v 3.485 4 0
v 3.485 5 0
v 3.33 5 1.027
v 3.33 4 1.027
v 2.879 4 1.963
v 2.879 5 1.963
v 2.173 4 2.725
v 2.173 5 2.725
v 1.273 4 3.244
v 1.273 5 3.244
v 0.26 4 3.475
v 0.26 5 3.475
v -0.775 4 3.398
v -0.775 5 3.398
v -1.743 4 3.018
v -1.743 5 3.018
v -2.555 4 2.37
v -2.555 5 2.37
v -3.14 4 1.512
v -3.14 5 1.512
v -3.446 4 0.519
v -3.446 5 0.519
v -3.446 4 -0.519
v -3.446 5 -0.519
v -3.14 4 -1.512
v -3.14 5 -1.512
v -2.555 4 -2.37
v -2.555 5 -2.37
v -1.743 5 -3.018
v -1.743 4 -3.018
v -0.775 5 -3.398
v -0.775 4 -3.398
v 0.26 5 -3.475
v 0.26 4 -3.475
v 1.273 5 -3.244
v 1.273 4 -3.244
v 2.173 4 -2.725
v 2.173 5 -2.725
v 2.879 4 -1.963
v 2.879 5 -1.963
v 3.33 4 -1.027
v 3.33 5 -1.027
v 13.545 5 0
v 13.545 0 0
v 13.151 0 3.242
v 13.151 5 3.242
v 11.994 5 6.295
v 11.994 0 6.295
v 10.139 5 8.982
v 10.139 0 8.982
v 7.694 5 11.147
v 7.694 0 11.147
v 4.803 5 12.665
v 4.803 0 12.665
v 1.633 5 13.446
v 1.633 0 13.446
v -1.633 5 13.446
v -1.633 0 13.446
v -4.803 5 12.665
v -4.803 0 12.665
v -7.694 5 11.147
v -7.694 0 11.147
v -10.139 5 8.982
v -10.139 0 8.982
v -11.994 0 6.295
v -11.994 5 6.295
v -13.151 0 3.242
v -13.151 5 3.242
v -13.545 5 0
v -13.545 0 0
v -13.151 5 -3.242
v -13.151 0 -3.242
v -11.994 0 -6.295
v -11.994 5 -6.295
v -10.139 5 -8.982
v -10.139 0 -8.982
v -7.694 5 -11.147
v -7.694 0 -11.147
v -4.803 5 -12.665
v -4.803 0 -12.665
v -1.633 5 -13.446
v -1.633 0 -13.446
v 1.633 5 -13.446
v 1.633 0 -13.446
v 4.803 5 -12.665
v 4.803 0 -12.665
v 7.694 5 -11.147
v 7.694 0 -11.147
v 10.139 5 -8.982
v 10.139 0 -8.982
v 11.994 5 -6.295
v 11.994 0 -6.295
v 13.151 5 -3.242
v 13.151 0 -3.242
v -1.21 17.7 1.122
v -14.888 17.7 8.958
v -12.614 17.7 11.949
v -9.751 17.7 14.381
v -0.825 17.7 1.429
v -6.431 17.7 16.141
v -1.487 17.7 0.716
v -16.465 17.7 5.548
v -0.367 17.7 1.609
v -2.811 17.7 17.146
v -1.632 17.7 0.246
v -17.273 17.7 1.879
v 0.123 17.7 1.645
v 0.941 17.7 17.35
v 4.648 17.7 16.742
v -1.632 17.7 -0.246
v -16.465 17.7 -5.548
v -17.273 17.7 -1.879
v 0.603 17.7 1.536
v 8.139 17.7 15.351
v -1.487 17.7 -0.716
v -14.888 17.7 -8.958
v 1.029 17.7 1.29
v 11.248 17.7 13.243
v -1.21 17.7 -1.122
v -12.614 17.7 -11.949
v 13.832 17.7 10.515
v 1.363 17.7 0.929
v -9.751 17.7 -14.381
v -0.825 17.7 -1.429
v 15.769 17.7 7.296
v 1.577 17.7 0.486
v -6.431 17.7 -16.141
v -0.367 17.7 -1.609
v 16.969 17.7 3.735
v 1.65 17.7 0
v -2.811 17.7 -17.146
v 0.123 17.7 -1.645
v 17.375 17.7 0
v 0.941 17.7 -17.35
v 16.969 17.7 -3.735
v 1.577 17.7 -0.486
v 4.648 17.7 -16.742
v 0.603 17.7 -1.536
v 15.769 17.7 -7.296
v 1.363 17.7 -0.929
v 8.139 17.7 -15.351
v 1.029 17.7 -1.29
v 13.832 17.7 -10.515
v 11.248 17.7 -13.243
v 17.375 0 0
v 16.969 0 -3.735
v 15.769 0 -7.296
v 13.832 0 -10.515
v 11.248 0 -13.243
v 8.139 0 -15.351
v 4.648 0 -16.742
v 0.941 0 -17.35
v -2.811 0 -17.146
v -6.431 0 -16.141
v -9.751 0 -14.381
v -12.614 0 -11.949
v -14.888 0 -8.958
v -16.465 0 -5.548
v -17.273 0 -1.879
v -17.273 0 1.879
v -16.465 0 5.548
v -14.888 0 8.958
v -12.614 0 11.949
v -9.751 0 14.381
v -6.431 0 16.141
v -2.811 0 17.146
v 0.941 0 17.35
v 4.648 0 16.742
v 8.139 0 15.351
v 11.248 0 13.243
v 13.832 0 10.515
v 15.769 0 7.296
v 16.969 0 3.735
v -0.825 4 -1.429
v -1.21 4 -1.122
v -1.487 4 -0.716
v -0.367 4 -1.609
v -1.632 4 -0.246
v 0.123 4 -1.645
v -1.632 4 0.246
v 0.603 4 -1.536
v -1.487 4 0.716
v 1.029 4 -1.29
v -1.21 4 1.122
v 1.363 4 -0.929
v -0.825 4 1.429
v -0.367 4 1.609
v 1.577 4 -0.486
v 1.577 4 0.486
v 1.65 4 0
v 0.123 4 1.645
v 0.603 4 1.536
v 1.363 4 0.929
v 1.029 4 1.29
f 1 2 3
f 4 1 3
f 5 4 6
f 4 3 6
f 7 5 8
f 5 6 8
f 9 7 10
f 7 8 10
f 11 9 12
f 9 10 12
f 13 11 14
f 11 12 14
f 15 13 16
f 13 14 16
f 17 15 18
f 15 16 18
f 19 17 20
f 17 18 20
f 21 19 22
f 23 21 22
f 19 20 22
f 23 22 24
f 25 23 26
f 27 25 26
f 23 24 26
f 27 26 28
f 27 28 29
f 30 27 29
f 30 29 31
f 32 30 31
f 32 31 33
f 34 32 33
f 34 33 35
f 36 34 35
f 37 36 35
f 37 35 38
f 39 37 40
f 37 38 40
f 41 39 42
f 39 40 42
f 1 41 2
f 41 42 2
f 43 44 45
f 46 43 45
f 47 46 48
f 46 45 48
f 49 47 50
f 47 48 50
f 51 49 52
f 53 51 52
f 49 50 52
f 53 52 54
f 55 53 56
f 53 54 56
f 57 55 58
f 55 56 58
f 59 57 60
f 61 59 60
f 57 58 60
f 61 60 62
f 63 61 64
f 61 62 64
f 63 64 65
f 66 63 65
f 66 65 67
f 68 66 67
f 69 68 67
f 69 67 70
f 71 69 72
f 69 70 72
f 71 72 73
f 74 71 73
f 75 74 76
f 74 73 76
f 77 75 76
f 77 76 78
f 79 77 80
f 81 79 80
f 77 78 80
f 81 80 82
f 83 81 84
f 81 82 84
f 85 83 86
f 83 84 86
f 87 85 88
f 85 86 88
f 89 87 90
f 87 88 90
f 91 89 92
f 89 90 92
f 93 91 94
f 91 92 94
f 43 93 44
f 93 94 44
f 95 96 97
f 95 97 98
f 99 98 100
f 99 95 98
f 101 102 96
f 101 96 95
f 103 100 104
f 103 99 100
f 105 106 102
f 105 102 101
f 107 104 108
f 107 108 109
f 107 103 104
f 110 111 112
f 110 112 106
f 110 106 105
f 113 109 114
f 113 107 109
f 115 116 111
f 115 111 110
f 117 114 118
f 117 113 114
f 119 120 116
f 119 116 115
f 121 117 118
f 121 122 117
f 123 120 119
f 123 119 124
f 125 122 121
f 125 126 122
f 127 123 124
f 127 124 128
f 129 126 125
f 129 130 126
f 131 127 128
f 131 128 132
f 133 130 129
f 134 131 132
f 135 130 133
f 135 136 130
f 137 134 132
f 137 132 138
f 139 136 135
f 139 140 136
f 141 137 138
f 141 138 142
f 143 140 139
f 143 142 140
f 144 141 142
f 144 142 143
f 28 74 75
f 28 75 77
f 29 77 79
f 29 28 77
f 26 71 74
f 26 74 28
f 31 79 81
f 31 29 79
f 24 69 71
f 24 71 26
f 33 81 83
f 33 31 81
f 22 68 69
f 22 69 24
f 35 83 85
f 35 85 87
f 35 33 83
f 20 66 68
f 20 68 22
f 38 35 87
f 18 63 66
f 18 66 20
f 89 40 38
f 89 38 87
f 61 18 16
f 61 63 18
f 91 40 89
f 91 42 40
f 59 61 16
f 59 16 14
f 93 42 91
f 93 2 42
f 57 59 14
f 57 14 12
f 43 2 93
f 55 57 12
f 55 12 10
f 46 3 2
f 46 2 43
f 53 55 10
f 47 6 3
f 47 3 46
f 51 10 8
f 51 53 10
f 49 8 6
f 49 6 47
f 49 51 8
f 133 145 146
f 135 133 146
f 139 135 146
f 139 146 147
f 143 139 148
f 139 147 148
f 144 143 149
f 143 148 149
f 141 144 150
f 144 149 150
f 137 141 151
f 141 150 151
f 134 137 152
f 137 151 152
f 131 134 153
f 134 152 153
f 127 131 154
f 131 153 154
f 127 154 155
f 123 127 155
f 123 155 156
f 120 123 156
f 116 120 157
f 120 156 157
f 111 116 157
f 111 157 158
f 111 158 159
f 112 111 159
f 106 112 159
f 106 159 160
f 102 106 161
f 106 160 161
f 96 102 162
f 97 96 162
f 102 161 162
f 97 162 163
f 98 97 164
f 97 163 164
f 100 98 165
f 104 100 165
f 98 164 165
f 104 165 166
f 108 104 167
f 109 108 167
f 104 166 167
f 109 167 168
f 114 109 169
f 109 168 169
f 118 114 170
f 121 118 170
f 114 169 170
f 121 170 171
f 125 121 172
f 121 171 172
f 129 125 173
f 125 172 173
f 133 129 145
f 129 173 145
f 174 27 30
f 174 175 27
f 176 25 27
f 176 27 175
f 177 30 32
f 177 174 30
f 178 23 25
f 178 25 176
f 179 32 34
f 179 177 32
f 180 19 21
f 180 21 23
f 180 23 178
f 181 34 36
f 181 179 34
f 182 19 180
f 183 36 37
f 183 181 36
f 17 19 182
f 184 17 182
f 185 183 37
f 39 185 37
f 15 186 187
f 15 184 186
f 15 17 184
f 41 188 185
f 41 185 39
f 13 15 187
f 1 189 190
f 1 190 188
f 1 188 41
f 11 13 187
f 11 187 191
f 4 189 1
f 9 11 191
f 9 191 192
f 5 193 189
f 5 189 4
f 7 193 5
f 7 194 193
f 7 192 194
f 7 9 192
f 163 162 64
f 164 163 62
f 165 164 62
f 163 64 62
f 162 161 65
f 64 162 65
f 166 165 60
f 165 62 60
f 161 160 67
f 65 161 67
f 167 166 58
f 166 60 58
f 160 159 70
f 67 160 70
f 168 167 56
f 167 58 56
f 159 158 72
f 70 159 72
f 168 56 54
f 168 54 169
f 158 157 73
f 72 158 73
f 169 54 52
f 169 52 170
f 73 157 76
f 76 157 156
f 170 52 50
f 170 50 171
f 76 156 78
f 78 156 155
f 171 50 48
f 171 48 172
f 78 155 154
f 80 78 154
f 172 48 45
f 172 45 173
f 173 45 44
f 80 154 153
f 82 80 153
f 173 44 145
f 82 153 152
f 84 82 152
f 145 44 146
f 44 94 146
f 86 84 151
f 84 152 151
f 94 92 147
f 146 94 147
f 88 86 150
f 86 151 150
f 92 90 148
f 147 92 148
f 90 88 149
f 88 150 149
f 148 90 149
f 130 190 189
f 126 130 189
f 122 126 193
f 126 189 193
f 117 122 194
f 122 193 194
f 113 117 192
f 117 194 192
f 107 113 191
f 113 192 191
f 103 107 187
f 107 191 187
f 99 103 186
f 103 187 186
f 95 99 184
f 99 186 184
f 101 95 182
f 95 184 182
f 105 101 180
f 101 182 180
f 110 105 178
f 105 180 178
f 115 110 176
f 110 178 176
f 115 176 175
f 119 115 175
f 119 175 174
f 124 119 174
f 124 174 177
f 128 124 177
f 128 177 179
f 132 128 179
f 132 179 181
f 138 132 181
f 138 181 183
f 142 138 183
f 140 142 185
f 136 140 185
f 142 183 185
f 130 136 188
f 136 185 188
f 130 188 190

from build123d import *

# Parameters (mm, degrees)
SKETCH1_R           = 17.375
BOSS_EXTRUDE1_DEPTH = 17.7
SKETCH7_R           = 13.545
CUT_EXTRUDE4_DEPTH  = 5
SKETCH10_R          = 3.485
BOSS_EXTRUDE3_DEPTH = 1
SKETCH11_R          = 1.65
CUT_EXTRUDE5_DEPTH  = 13.7


with BuildPart() as part:
    # Sketch1 → Boss-Extrude1 (new body)
    with BuildSketch(Plane(origin=(0, 0, 0), x_dir=(1, 0, 0), z_dir=(0, 1, 0))):
        Circle(SKETCH1_R)
    extrude(amount=BOSS_EXTRUDE1_DEPTH)

    # Sketch7 → Cut-Extrude4 (cut)
    with BuildSketch(Plane.XZ):
        Circle(SKETCH7_R)
    extrude(amount=-CUT_EXTRUDE4_DEPTH, mode=Mode.SUBTRACT)

    # Sketch10 → Boss-Extrude3 (add)
    with BuildSketch(Plane.XZ.offset(-5)):
        Circle(SKETCH10_R)
    extrude(amount=BOSS_EXTRUDE3_DEPTH)

    # Sketch11 → Cut-Extrude5 (cut)
    with BuildSketch(Plane.XZ.offset(-4)):
        Circle(SKETCH11_R)
    extrude(amount=-CUT_EXTRUDE5_DEPTH, mode=Mode.SUBTRACT)


solid = part.part
